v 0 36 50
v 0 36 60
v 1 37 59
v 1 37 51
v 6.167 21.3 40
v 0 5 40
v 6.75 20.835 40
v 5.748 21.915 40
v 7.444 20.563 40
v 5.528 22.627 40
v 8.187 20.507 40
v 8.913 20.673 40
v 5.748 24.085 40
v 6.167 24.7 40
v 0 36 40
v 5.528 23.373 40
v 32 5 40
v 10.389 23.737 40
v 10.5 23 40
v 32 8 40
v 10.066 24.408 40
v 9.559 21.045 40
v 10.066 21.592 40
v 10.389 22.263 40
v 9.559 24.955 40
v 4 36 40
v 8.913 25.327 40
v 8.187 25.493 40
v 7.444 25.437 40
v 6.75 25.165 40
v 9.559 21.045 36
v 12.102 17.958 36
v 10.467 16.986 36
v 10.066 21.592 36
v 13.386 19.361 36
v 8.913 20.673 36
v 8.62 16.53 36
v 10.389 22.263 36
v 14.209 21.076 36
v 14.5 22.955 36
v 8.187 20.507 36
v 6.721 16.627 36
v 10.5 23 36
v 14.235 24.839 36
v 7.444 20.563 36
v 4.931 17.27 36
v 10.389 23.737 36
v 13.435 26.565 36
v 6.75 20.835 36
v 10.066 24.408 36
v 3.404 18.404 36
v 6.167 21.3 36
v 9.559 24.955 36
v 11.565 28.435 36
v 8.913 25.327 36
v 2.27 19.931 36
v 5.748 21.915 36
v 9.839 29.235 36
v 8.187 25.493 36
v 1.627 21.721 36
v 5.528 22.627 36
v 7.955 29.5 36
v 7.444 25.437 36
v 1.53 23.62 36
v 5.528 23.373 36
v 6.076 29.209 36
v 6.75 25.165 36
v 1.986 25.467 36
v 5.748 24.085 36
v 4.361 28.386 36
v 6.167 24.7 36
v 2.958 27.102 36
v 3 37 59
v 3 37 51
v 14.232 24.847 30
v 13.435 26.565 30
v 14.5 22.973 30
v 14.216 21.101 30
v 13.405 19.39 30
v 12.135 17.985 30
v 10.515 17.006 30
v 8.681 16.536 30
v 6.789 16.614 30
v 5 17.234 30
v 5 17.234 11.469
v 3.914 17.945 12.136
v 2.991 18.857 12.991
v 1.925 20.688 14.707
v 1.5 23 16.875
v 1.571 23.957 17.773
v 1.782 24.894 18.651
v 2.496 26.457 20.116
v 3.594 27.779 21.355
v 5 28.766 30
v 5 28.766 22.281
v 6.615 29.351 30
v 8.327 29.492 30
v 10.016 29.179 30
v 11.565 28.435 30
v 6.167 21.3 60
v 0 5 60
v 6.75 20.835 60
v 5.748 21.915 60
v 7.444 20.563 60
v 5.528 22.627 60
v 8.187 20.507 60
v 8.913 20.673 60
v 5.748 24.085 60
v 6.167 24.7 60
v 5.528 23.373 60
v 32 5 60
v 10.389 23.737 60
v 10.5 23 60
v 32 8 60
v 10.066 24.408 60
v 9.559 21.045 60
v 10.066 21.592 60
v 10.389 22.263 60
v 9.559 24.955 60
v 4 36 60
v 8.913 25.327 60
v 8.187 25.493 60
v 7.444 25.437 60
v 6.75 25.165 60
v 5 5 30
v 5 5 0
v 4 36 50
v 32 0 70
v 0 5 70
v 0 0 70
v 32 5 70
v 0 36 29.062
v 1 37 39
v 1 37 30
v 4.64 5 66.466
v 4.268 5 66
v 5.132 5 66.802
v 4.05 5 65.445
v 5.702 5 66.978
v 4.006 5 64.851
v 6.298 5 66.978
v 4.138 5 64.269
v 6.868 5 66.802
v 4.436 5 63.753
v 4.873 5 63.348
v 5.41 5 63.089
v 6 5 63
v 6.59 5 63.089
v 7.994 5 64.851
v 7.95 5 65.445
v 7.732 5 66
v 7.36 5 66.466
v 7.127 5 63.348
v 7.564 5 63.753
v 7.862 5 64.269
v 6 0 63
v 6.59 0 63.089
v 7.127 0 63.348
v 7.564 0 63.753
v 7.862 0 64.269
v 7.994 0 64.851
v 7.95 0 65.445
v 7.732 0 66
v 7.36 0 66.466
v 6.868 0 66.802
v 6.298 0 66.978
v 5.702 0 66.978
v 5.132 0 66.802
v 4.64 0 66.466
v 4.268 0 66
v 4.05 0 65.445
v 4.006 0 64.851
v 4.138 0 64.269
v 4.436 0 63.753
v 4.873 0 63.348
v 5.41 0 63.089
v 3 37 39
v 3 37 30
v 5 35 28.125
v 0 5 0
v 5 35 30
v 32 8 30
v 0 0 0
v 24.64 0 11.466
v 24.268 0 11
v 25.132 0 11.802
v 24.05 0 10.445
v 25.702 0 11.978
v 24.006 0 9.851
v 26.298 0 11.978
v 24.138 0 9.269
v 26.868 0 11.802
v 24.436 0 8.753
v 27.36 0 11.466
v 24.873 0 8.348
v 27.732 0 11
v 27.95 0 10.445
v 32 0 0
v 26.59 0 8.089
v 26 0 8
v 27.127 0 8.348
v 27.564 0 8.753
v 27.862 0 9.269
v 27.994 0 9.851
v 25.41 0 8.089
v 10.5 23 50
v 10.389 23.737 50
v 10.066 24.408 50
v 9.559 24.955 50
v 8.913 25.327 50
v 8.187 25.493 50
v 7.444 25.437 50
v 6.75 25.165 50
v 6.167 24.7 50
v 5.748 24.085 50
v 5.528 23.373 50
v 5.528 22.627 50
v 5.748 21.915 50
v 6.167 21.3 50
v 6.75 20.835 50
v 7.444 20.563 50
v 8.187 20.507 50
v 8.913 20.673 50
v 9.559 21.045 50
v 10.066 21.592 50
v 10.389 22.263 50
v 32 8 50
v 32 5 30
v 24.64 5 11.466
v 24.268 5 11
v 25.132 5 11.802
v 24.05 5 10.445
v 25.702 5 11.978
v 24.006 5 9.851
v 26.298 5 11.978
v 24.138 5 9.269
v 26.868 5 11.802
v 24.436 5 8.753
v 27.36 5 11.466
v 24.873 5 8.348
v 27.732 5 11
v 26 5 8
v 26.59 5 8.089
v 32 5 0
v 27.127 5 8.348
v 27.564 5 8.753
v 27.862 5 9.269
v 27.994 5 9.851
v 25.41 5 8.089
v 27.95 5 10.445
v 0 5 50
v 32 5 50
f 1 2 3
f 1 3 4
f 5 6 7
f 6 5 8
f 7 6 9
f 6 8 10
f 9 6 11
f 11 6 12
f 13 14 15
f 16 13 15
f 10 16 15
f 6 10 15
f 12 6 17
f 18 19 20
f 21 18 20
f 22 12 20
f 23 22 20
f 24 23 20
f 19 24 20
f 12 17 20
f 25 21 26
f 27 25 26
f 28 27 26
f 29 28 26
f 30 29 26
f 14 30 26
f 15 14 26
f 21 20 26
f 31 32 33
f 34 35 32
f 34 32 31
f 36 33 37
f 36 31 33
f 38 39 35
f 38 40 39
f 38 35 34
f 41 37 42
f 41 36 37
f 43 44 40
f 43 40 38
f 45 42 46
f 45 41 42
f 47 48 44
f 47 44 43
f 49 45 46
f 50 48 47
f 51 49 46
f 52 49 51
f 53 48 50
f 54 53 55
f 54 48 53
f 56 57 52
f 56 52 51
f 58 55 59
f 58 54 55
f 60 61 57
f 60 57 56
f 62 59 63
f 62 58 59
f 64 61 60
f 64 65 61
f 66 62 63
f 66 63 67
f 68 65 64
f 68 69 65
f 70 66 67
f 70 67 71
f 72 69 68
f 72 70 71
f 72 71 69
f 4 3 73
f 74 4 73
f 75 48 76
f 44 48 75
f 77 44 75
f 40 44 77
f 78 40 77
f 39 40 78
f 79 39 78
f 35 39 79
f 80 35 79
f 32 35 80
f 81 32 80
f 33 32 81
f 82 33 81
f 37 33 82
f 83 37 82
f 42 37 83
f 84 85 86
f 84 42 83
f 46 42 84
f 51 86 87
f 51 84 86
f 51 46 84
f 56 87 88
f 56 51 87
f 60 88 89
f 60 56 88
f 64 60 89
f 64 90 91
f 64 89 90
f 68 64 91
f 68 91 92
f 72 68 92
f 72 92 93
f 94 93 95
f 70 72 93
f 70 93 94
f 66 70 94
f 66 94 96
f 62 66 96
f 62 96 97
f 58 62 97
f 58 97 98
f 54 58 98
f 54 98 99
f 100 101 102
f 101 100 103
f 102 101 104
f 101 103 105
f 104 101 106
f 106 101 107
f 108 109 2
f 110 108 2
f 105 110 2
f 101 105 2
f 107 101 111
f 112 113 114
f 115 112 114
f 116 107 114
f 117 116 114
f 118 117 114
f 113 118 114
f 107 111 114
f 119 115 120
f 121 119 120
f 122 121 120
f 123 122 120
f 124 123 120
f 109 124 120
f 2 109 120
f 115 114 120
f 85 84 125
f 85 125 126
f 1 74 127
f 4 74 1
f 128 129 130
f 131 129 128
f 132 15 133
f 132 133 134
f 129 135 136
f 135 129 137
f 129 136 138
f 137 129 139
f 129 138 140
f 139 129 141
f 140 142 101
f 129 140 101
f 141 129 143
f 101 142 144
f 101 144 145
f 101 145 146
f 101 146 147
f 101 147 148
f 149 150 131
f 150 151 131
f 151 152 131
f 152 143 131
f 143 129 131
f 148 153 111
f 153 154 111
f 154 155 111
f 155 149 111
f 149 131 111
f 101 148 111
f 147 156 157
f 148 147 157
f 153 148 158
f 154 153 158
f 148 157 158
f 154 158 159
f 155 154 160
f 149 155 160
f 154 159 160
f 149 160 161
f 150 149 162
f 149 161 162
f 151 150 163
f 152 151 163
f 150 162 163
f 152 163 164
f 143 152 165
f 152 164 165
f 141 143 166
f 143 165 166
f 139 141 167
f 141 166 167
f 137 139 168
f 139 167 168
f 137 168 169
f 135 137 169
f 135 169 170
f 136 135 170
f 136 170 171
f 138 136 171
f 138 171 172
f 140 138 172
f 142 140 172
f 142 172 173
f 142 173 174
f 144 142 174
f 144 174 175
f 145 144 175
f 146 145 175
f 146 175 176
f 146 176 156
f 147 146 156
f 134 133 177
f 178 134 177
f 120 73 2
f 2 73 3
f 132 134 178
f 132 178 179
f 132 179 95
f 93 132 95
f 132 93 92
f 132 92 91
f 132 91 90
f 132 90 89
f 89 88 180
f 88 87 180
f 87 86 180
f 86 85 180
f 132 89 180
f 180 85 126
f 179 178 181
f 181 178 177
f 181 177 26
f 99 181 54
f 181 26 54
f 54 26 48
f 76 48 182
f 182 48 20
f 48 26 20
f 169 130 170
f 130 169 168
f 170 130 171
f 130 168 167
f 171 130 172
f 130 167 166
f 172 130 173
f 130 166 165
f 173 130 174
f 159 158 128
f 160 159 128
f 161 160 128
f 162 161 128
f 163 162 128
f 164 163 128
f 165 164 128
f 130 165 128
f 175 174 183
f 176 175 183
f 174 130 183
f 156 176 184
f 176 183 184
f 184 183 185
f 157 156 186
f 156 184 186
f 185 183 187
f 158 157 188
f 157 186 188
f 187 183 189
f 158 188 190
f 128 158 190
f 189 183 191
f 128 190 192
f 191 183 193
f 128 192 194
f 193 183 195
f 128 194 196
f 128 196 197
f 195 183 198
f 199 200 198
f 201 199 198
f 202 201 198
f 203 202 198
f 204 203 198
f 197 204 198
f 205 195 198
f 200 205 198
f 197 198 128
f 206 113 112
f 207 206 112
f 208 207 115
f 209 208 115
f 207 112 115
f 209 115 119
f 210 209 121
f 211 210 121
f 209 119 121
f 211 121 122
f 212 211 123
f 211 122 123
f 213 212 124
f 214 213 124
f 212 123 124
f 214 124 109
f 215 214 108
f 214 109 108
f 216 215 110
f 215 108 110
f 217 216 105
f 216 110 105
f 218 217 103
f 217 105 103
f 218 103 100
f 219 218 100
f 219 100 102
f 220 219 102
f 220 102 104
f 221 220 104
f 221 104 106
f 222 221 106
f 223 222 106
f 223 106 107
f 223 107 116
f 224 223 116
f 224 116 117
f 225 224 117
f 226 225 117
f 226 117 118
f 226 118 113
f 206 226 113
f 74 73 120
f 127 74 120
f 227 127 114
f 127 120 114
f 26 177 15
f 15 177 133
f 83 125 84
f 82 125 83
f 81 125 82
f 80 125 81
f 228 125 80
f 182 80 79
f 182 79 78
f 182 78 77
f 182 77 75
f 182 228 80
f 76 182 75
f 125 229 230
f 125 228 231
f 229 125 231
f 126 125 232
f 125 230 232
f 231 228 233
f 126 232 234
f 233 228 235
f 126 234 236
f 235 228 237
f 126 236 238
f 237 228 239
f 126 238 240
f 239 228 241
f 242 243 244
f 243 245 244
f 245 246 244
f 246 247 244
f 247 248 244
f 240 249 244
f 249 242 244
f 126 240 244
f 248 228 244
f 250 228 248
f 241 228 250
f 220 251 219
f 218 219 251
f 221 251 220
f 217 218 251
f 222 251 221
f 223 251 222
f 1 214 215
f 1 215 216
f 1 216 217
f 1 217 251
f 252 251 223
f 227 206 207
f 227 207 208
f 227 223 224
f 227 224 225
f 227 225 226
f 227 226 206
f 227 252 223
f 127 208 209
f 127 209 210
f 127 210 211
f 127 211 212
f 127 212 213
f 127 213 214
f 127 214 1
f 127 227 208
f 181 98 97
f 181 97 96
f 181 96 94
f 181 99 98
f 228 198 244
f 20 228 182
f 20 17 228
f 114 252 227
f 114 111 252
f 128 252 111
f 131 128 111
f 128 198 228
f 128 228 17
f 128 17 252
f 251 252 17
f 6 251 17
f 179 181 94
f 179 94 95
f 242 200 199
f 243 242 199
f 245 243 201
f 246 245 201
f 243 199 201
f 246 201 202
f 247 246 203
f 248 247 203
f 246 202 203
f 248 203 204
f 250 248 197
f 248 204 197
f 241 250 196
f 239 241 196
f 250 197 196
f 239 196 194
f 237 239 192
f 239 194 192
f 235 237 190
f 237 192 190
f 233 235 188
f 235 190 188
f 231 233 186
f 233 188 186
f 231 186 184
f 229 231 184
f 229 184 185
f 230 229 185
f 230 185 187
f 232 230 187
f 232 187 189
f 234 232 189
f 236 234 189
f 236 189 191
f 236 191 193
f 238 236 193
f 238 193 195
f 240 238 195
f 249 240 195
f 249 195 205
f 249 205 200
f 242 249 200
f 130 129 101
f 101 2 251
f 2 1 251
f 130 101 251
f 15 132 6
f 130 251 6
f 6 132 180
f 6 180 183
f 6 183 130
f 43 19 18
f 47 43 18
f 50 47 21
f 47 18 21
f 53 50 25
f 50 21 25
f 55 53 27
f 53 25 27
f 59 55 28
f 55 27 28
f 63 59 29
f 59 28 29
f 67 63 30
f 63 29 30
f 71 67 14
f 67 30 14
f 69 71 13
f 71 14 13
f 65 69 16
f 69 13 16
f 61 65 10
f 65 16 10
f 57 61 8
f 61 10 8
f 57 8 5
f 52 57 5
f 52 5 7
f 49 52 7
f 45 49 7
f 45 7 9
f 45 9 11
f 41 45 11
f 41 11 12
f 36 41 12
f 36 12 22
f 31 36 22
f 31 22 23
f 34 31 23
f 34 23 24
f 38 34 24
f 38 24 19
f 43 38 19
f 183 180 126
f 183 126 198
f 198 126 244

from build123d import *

# Parameters (mm, degrees)
EXTRUDE_1_DEPTH           = 70
CUT_EXTRUDE_1_DEPTH       = 100.498743711
SKETCH_3_W                = 10
SKETCH_3_H                = 45
CUT_EXTRUDE_2_DEPTH       = 92.782351245
CUT_EXTRUDE_5_DEPTH       = 92.782351245
CUT_EXTRUDE_6_DEPTH       = 87.740993769
SKETCH_8_W                = 30
SKETCH_8_H                = 32
CUT_EXTRUDE_7_DEPTH       = 27
CUT_EXTRUDE_8_DEPTH       = 84.654049513
SKETCH_10_R               = 2
CUT_EXTRUDE_9_DEPTH       = 27
SKETCH_15_R               = 2.5
CUT_EXTRUDE_11_DEPTH      = 86.399063227
CUT_EXTRUDE_12_DEPTH      = 26
CUT_EXTRUDE_12_DEPTH_BACK = 6
SKETCH_16_R               = 6.5
CHAMFER_1_SIZE            = 1


with BuildPart() as part:
    # 草图1 → 拉伸1 (new body)
    with BuildSketch(Plane.XY):
        Polygon((0, 0), (50, 0), (0, 50), align=None)
    extrude(amount=EXTRUDE_1_DEPTH)

    # 草图2 → 切除-拉伸1 (cut, through all)
    with BuildSketch(Plane.XY.offset(70)):
        Polygon((50, 0), (32, 0), (32, 18), align=None)
    extrude(amount=-CUT_EXTRUDE_1_DEPTH, mode=Mode.SUBTRACT)

    # 草图3 → 切除-拉伸2 (cut, through all)
    with BuildSketch(Plane(origin=(32, 0, 0), x_dir=(0, 0, -1), z_dir=(1, 0, 0))):
        with Locations((-65, 27.5)):
            Rectangle(SKETCH_3_W, SKETCH_3_H)
        with Locations((-45, 27.5)):
            Rectangle(SKETCH_3_W, SKETCH_3_H)
    extrude(amount=-CUT_EXTRUDE_2_DEPTH, mode=Mode.SUBTRACT)

    # 草图6 → 切除-拉伸5 (cut, through all)
    with BuildSketch(Plane.XY.offset(70)):
        Polygon((0, 50), (0, 40), (32, 8), (32, 18), align=None)
    extrude(amount=-CUT_EXTRUDE_5_DEPTH, mode=Mode.SUBTRACT)

    # 草图7 → 切除-拉伸6 (cut, through all)
    with BuildSketch(Plane.XY.offset(70)):
        Polygon((0, 40), (0, 37), (3, 37), align=None)
    extrude(amount=-CUT_EXTRUDE_6_DEPTH, mode=Mode.SUBTRACT)

    # 草图8 → 切除-拉伸7 (cut)
    with BuildSketch(Plane(origin=(32, 0, 0), x_dir=(0, 0, -1), z_dir=(1, 0, 0))):
        with Locations((-15, 21)):
            Rectangle(SKETCH_8_W, SKETCH_8_H)
    extrude(amount=-CUT_EXTRUDE_7_DEPTH, mode=Mode.SUBTRACT)

    # 草图9 → 切除-拉伸8 (cut, through all)
    with BuildSketch(Plane(origin=(5, 0, 0), x_dir=(0, 0, -1), z_dir=(1, 0, 0))):
        Polygon((0, 5), (0, 37), (-30, 37), align=None)
    extrude(amount=-CUT_EXTRUDE_8_DEPTH, mode=Mode.SUBTRACT)

    # 草图10 → 切除-拉伸9 (cut)
    with BuildSketch(Plane.XZ):
        with Locations(Location((6, 65, 0), (0, 0, 270))):
            Circle(SKETCH_10_R)
        with Locations(Location((26, 10, 0), (0, 0, 270))):
            Circle(SKETCH_10_R)
    extrude(amount=-CUT_EXTRUDE_9_DEPTH, mode=Mode.SUBTRACT)

    # 草图15 → 切除-拉伸11 (cut, through all)
    with BuildSketch(Plane.XY.offset(70)):
        with Locations((8, 23)):
            Circle(SKETCH_15_R)
    extrude(amount=-CUT_EXTRUDE_11_DEPTH, mode=Mode.SUBTRACT)

    # 草图16 → 切除-拉伸12 (cut, two sides: drawn at the far end of the back side and taken through both)
    with BuildSketch(Plane(origin=(0, 0, 30), x_dir=(-1, 0, 0), z_dir=(0, 0, -1)).offset(-CUT_EXTRUDE_12_DEPTH_BACK)):
        with Locations((-8, 23)):
            Circle(SKETCH_16_R)
    extrude(amount=CUT_EXTRUDE_12_DEPTH + CUT_EXTRUDE_12_DEPTH_BACK, mode=Mode.SUBTRACT)

    # 倒角1
    chamfer_1_edges = [part.edges().sort_by_distance(p)[0] for p in [
        (0, 37, 35),
        (1.5, 37, 60),
        (1.5, 37, 50),
        (1.5, 37, 40),
        (0, 37, 55),
    ]]
    chamfer(chamfer_1_edges, length=CHAMFER_1_SIZE)


solid = part.part
